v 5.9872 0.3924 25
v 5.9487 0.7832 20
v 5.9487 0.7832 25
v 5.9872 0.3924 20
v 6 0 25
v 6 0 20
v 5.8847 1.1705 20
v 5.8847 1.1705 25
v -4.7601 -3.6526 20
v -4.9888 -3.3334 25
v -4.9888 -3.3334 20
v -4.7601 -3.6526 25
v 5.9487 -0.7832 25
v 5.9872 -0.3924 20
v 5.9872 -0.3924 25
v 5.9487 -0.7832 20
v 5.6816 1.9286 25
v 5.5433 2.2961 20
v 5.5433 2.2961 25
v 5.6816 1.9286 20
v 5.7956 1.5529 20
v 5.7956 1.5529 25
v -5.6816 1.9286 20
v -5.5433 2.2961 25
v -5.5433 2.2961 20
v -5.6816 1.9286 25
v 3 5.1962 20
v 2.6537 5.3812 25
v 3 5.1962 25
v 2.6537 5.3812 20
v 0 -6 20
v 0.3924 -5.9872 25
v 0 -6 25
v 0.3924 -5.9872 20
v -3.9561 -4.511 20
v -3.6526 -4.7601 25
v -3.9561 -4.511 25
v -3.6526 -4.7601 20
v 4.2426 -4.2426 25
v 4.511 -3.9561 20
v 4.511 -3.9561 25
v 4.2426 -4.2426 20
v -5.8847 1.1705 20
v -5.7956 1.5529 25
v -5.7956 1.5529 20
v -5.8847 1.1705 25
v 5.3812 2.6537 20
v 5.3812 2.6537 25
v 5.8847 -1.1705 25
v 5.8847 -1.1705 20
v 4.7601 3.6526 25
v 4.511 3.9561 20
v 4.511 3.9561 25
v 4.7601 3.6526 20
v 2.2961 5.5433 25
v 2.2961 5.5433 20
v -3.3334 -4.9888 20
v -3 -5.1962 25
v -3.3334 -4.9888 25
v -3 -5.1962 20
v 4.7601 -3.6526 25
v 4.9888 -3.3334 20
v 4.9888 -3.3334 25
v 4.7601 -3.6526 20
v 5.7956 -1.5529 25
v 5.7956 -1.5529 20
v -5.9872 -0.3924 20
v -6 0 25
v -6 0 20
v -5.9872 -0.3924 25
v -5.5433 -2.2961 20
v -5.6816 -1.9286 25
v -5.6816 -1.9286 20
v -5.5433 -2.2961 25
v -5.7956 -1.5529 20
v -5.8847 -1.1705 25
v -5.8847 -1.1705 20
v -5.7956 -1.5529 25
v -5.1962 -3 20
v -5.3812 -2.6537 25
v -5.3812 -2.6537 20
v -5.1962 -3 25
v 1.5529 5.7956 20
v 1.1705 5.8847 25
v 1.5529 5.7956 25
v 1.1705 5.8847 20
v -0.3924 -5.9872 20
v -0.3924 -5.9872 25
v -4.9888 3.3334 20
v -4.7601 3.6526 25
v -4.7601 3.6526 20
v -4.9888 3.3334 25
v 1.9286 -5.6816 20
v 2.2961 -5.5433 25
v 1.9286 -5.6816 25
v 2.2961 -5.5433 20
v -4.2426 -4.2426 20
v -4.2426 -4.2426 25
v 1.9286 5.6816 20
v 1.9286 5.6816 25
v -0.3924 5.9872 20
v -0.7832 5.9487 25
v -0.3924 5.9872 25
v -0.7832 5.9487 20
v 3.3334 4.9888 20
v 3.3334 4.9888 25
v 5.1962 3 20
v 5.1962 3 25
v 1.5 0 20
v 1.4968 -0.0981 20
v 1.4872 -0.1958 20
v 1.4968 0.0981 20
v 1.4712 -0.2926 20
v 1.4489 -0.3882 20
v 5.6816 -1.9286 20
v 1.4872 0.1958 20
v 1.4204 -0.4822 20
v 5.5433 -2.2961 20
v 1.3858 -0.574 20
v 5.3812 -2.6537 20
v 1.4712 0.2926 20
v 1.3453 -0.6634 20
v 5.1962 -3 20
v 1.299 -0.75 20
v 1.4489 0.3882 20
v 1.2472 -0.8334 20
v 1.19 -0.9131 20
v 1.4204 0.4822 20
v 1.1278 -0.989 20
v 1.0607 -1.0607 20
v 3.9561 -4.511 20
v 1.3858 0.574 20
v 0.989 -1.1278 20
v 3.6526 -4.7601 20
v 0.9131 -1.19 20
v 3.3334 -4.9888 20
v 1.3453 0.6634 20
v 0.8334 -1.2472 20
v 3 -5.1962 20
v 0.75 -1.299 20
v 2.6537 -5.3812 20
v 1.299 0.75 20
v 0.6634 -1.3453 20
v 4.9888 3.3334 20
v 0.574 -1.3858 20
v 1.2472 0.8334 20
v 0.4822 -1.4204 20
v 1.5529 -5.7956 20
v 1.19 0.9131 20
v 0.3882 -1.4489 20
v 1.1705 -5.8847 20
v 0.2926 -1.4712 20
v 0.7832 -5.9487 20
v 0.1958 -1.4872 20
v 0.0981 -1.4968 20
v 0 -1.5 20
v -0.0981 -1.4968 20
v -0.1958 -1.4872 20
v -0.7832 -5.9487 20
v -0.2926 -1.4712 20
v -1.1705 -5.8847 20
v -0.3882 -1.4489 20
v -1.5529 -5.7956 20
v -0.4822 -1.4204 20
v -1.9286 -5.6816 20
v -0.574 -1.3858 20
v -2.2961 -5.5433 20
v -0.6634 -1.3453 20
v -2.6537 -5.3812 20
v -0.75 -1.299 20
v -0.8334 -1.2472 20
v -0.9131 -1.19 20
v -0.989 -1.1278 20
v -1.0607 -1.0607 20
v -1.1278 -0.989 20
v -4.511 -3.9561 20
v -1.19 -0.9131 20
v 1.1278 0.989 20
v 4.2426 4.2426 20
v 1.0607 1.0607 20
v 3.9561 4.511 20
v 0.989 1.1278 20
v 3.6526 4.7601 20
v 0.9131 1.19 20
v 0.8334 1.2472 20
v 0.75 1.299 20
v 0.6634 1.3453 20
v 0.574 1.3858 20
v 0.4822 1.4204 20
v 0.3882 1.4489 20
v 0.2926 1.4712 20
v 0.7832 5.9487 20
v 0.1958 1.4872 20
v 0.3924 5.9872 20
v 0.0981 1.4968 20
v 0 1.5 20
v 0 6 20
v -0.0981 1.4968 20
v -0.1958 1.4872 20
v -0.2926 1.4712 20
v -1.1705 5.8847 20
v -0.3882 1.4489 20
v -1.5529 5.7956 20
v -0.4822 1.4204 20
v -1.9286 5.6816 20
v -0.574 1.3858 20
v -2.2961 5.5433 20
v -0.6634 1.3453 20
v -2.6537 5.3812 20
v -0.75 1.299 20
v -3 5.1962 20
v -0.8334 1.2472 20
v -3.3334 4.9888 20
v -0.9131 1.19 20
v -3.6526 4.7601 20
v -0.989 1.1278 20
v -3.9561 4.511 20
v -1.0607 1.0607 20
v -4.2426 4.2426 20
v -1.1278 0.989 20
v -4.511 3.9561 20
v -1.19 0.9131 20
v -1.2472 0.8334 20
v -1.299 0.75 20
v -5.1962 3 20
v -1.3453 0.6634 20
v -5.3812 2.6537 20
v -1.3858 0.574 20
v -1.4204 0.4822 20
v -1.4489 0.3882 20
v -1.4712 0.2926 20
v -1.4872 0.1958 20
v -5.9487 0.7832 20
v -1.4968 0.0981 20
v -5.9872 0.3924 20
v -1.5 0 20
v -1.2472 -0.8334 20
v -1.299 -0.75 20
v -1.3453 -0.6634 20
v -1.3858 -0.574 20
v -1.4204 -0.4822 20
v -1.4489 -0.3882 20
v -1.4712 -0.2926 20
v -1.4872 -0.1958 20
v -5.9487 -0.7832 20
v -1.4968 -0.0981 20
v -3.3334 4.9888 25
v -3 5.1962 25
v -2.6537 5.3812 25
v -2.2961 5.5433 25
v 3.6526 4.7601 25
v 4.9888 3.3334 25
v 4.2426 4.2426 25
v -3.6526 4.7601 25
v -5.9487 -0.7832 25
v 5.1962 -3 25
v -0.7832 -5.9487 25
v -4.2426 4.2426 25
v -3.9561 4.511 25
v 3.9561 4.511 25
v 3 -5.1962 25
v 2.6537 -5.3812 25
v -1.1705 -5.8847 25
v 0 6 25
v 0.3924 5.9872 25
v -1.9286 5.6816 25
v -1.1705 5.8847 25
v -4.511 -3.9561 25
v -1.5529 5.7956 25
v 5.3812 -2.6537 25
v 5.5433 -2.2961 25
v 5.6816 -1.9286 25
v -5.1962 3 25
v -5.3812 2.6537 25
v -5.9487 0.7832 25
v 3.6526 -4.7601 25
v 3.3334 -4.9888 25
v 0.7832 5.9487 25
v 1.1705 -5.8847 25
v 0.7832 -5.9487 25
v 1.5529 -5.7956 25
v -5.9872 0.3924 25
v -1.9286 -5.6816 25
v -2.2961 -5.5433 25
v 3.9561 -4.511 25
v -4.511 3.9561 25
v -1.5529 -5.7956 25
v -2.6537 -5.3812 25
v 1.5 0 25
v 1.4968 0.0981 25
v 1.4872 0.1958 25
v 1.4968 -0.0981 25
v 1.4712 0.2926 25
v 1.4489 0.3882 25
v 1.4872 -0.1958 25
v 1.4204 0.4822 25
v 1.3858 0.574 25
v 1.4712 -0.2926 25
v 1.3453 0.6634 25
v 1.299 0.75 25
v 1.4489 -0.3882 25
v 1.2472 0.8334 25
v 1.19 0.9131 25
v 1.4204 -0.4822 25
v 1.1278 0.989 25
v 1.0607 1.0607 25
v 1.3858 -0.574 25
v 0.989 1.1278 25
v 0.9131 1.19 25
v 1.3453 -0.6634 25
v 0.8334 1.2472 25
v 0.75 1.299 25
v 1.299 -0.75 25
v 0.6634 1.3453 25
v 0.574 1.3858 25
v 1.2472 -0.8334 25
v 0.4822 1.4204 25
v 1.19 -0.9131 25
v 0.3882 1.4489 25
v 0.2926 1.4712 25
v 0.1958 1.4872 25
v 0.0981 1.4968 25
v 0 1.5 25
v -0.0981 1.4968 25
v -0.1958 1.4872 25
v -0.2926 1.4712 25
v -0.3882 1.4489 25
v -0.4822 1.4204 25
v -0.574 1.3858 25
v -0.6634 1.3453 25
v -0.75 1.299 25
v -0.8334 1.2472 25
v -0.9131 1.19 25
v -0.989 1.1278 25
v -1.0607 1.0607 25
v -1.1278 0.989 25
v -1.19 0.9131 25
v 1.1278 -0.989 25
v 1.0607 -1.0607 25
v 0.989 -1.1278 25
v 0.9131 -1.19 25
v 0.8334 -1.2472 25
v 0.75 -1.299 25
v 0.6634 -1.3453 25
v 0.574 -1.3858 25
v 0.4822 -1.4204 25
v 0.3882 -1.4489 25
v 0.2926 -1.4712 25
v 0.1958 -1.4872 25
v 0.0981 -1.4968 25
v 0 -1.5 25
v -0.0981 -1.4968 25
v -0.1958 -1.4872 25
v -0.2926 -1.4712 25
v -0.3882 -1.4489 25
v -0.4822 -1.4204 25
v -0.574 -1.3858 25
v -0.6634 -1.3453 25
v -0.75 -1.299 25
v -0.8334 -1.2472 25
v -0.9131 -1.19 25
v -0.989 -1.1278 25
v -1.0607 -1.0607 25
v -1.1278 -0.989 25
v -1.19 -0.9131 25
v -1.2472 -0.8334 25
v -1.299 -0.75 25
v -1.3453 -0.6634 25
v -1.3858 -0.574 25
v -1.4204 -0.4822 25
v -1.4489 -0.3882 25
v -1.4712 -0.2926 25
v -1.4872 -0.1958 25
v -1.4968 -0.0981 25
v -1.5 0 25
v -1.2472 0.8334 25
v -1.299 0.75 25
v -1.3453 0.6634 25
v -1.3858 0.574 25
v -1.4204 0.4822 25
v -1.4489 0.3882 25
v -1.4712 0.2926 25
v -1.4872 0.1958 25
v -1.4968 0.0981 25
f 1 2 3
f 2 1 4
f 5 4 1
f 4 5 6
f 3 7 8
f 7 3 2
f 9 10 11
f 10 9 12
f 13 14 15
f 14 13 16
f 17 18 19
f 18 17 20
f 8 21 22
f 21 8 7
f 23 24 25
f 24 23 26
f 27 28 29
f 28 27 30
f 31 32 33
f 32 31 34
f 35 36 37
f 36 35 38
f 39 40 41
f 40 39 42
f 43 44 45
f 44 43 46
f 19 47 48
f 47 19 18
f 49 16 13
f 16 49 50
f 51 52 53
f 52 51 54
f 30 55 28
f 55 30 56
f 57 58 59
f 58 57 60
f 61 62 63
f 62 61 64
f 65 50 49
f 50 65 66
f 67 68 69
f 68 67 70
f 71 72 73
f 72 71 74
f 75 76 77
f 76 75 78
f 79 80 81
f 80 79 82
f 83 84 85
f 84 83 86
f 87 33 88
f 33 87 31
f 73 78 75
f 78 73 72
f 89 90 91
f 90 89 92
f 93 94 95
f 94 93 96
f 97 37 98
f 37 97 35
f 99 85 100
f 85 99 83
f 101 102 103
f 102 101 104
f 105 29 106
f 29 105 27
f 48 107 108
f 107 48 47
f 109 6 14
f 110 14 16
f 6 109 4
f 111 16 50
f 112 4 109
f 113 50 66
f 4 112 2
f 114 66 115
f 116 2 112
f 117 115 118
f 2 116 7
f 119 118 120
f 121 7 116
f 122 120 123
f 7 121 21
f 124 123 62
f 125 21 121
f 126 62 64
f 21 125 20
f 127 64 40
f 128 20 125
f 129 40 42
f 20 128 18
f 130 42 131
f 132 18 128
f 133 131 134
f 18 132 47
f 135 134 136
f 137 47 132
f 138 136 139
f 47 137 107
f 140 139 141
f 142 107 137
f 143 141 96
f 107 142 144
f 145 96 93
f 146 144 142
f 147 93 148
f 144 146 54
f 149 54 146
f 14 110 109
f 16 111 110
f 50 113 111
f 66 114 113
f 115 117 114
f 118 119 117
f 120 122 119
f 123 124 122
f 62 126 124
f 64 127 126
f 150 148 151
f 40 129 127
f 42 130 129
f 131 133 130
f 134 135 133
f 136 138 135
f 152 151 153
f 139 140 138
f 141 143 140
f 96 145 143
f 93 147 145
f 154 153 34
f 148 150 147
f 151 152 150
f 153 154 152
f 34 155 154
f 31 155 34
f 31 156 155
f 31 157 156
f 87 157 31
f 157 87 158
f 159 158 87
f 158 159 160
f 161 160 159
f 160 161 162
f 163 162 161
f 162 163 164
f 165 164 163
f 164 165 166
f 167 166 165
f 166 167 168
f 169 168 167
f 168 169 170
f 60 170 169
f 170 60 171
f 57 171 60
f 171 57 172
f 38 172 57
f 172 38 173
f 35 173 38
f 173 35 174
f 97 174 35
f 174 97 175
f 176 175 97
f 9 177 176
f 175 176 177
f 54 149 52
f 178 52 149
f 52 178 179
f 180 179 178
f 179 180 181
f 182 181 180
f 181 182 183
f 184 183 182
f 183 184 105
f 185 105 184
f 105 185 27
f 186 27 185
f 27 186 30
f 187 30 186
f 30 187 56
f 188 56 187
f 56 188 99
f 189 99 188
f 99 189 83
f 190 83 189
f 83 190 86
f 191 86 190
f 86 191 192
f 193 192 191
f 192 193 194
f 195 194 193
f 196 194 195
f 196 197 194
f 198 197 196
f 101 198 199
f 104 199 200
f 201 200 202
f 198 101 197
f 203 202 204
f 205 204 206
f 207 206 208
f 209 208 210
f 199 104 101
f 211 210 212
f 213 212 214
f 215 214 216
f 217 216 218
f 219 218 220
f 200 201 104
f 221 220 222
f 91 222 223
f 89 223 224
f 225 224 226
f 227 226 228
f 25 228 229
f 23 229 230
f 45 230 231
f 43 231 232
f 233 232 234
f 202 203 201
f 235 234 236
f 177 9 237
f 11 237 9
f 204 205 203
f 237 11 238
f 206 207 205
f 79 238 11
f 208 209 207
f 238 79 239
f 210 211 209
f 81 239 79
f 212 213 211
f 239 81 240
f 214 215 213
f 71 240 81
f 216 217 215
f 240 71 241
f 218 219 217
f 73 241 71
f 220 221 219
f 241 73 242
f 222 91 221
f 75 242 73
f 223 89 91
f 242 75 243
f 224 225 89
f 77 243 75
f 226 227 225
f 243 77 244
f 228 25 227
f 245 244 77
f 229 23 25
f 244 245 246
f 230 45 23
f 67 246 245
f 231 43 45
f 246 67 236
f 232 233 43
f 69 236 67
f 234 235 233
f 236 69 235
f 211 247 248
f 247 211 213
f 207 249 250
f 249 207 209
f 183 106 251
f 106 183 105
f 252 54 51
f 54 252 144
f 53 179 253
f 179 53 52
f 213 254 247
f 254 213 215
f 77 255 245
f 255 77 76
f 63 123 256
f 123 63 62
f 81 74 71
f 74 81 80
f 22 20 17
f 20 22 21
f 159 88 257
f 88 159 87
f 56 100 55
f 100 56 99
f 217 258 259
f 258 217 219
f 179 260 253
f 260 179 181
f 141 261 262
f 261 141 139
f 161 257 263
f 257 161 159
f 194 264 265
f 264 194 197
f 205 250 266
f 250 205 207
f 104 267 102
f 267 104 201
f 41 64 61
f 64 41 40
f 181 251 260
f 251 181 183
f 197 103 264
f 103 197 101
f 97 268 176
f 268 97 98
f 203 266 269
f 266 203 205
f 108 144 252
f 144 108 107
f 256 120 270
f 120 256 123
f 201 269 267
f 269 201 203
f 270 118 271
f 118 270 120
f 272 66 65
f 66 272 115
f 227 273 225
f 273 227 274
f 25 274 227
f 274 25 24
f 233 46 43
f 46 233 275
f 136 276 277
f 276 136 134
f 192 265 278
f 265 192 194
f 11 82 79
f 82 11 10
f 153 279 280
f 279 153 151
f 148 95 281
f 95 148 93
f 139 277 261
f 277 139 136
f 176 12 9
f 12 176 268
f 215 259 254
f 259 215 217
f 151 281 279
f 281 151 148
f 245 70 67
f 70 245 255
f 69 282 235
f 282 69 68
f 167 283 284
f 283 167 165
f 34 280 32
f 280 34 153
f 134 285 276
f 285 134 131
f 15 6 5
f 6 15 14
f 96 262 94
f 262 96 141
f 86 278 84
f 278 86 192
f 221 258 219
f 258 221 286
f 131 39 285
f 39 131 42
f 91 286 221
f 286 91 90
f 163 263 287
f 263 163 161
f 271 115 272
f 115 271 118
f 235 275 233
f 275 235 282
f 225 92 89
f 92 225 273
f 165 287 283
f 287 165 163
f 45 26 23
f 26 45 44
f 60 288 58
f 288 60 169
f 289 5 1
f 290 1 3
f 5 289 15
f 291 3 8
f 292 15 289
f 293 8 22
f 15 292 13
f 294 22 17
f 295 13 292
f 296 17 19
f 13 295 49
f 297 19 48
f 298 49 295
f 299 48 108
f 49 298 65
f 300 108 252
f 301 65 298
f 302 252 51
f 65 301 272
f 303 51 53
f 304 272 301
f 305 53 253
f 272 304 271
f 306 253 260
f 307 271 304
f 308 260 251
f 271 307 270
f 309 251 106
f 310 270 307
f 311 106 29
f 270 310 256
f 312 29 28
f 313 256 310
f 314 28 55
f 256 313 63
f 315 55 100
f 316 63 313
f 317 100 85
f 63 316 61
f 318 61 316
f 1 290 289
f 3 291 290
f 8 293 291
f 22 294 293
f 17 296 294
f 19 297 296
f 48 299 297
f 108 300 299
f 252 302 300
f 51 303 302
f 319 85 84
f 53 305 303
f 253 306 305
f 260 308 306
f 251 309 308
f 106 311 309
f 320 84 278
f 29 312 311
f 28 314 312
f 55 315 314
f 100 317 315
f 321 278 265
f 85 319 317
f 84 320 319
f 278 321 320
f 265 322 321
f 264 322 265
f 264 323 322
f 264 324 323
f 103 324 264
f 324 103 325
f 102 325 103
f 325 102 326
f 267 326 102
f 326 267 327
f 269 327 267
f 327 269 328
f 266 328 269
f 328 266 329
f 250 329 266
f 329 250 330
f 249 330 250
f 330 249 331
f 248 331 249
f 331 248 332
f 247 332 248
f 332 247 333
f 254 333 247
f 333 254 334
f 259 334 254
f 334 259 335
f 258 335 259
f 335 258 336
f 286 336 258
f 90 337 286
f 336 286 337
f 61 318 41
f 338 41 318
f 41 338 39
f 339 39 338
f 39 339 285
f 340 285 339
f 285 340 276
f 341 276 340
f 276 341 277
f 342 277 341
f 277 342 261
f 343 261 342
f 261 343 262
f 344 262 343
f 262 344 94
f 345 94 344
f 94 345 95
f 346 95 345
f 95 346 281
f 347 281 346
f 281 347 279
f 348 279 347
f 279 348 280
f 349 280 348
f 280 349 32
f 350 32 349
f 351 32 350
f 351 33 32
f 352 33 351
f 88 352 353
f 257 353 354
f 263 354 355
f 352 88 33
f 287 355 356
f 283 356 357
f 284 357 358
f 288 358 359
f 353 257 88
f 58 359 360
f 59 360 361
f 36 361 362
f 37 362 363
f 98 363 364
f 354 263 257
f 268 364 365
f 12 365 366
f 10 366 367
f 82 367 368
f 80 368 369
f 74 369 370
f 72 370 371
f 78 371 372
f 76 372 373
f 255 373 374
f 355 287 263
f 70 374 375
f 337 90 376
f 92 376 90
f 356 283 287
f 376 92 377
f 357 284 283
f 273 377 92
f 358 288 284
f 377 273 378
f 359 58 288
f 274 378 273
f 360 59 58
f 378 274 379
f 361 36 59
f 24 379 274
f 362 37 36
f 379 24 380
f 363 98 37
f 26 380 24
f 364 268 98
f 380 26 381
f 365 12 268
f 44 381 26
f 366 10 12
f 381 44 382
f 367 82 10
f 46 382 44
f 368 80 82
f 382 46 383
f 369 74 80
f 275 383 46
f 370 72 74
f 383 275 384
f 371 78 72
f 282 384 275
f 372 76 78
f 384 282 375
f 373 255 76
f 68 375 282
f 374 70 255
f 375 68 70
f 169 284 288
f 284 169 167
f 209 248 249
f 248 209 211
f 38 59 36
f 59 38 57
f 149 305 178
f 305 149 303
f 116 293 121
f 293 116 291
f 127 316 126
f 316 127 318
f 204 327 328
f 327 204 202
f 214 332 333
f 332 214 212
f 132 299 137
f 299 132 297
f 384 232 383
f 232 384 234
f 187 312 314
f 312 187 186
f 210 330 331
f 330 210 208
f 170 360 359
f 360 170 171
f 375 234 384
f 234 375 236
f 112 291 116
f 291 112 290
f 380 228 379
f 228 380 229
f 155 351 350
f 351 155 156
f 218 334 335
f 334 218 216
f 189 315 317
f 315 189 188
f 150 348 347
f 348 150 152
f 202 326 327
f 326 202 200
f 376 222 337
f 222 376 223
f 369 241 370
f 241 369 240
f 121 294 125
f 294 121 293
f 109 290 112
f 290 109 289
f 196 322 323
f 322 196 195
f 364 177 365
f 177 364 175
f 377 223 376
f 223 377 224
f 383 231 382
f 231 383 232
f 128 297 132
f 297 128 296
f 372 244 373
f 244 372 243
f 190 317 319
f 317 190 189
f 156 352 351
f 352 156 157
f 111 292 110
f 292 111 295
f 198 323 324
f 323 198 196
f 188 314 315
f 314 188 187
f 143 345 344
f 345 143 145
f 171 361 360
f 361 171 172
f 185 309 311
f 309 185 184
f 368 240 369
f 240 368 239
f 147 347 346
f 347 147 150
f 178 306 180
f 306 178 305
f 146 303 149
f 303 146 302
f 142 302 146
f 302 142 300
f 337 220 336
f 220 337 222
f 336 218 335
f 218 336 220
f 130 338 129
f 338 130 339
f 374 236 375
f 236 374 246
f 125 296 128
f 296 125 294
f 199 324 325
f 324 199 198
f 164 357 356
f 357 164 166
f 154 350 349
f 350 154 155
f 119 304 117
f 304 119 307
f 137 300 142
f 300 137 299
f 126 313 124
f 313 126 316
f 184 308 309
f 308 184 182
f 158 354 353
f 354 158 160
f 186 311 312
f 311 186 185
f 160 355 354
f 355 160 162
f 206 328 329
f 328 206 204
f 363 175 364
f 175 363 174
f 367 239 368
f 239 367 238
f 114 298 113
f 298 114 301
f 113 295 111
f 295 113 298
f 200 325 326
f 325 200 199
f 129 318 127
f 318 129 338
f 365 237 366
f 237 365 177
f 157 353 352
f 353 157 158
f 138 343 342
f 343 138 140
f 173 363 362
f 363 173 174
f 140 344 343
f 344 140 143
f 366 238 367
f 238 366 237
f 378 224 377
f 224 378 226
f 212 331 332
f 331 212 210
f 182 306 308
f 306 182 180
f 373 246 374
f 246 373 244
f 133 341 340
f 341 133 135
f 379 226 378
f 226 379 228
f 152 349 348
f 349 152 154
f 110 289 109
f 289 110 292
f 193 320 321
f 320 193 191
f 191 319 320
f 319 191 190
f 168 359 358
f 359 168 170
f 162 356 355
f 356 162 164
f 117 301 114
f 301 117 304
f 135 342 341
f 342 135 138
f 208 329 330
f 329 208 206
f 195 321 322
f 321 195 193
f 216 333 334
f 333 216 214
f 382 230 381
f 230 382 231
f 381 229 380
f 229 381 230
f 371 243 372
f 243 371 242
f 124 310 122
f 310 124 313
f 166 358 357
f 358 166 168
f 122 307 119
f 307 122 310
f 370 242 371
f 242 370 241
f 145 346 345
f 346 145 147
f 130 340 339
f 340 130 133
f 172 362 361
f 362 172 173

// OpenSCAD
// Hose-barb reducer: 8 mm ID tubing end (z = 0..20) -> 5 mm ID tubing end (z = 25..41)
// Print orientation: standing upright along +Z, centred on the Z axis.

// ---------------- Parameters ----------------
tube_a_id   = 8;    // first tubing inner diameter (mm)
tube_b_id   = 5;    // second tubing inner diameter (mm)
bore        = 3;    // through-bore diameter (mm)

barb_a_h    = 10;   // height of each 8 mm barb (mm)
barb_a_bot  = 7.5;  // outer diameter of each 8 mm barb at its bottom (mm)
barb_a_top  = 9.5;  // outer diameter of each 8 mm barb at its top (mm)

collar_d    = 12;   // diameter of the joining collar (mm)
collar_h    = 5;    // height of the joining collar (mm)

barb_b_h    = 8;    // height of each 5 mm barb (mm)
barb_b_bot  = 6.5;  // outer diameter of each 5 mm barb at its bottom (mm)
barb_b_top  = 5.0;  // outer diameter of each 5 mm barb at its top (mm)

eps         = 0.5;  // overshoot for clean boolean cuts (mm)

$fn = 96;           // curve resolution

// ---------------- Derived ----------------
tube_a_len = 20;    // z = 0 to 20
tube_b_len = 16;    // z = 25 to 41
wall       = 1;     // assumed wall thickness when stepping back from the tip

// ---------------- Model ----------------
difference() {
    union() {
        // ---- 8 mm tubing end ----
        for (i = [0 : 1])
            translate([0, 0, i * barb_a_h])
                linear_extrude(height = barb_a_h)
                    polygon([
                        [0, 0],
                        [(barb_a_bot / 2) * cos(0), (barb_a_bot / 2) * sin(0)],
                        [(barb_a_top / 2) * cos(0), (barb_a_top / 2) * sin(0)],
                        [-(barb_a_top / 2) * cos(0), (barb_a_top / 2) * sin(0)],
                        [-(barb_a_bot / 2) * cos(0), (barb_a_bot / 2) * sin(0)]
                    ]);

        // ---- joining collar ----
        translate([0, 0, tube_a_len])
            cylinder(d = collar_d, h = collar_h);

        // ---- 5 mm tubing end ----
        for (i = [0 : 1])
            translate([0, 0, tube_a_len + collar_h + i * barb_b_h])
                linear_extrude(height = barb_b_h)
                    polygon([
                        [0, 0],
                        [(barb_b_bot / 2) * cos(0), (barb_b_bot / 2) * sin(0)],
                        [(barb_b_top / 2) * cos(0), (barb_b_top / 2) * sin(0)],
                        [-(barb_b_top / 2) * cos(0), (barb_b_top / 2) * sin(0)],
                        [-(barb_b_bot / 2) * cos(0), (barb_b_bot / 2) * sin(0)]
                    ]);
    }

    // ---- through bore ----
    translate([0, 0, -eps])
        cylinder(d = bore, h = tube_a_len + collar_h + tube_b_len + 2 * eps);
}
